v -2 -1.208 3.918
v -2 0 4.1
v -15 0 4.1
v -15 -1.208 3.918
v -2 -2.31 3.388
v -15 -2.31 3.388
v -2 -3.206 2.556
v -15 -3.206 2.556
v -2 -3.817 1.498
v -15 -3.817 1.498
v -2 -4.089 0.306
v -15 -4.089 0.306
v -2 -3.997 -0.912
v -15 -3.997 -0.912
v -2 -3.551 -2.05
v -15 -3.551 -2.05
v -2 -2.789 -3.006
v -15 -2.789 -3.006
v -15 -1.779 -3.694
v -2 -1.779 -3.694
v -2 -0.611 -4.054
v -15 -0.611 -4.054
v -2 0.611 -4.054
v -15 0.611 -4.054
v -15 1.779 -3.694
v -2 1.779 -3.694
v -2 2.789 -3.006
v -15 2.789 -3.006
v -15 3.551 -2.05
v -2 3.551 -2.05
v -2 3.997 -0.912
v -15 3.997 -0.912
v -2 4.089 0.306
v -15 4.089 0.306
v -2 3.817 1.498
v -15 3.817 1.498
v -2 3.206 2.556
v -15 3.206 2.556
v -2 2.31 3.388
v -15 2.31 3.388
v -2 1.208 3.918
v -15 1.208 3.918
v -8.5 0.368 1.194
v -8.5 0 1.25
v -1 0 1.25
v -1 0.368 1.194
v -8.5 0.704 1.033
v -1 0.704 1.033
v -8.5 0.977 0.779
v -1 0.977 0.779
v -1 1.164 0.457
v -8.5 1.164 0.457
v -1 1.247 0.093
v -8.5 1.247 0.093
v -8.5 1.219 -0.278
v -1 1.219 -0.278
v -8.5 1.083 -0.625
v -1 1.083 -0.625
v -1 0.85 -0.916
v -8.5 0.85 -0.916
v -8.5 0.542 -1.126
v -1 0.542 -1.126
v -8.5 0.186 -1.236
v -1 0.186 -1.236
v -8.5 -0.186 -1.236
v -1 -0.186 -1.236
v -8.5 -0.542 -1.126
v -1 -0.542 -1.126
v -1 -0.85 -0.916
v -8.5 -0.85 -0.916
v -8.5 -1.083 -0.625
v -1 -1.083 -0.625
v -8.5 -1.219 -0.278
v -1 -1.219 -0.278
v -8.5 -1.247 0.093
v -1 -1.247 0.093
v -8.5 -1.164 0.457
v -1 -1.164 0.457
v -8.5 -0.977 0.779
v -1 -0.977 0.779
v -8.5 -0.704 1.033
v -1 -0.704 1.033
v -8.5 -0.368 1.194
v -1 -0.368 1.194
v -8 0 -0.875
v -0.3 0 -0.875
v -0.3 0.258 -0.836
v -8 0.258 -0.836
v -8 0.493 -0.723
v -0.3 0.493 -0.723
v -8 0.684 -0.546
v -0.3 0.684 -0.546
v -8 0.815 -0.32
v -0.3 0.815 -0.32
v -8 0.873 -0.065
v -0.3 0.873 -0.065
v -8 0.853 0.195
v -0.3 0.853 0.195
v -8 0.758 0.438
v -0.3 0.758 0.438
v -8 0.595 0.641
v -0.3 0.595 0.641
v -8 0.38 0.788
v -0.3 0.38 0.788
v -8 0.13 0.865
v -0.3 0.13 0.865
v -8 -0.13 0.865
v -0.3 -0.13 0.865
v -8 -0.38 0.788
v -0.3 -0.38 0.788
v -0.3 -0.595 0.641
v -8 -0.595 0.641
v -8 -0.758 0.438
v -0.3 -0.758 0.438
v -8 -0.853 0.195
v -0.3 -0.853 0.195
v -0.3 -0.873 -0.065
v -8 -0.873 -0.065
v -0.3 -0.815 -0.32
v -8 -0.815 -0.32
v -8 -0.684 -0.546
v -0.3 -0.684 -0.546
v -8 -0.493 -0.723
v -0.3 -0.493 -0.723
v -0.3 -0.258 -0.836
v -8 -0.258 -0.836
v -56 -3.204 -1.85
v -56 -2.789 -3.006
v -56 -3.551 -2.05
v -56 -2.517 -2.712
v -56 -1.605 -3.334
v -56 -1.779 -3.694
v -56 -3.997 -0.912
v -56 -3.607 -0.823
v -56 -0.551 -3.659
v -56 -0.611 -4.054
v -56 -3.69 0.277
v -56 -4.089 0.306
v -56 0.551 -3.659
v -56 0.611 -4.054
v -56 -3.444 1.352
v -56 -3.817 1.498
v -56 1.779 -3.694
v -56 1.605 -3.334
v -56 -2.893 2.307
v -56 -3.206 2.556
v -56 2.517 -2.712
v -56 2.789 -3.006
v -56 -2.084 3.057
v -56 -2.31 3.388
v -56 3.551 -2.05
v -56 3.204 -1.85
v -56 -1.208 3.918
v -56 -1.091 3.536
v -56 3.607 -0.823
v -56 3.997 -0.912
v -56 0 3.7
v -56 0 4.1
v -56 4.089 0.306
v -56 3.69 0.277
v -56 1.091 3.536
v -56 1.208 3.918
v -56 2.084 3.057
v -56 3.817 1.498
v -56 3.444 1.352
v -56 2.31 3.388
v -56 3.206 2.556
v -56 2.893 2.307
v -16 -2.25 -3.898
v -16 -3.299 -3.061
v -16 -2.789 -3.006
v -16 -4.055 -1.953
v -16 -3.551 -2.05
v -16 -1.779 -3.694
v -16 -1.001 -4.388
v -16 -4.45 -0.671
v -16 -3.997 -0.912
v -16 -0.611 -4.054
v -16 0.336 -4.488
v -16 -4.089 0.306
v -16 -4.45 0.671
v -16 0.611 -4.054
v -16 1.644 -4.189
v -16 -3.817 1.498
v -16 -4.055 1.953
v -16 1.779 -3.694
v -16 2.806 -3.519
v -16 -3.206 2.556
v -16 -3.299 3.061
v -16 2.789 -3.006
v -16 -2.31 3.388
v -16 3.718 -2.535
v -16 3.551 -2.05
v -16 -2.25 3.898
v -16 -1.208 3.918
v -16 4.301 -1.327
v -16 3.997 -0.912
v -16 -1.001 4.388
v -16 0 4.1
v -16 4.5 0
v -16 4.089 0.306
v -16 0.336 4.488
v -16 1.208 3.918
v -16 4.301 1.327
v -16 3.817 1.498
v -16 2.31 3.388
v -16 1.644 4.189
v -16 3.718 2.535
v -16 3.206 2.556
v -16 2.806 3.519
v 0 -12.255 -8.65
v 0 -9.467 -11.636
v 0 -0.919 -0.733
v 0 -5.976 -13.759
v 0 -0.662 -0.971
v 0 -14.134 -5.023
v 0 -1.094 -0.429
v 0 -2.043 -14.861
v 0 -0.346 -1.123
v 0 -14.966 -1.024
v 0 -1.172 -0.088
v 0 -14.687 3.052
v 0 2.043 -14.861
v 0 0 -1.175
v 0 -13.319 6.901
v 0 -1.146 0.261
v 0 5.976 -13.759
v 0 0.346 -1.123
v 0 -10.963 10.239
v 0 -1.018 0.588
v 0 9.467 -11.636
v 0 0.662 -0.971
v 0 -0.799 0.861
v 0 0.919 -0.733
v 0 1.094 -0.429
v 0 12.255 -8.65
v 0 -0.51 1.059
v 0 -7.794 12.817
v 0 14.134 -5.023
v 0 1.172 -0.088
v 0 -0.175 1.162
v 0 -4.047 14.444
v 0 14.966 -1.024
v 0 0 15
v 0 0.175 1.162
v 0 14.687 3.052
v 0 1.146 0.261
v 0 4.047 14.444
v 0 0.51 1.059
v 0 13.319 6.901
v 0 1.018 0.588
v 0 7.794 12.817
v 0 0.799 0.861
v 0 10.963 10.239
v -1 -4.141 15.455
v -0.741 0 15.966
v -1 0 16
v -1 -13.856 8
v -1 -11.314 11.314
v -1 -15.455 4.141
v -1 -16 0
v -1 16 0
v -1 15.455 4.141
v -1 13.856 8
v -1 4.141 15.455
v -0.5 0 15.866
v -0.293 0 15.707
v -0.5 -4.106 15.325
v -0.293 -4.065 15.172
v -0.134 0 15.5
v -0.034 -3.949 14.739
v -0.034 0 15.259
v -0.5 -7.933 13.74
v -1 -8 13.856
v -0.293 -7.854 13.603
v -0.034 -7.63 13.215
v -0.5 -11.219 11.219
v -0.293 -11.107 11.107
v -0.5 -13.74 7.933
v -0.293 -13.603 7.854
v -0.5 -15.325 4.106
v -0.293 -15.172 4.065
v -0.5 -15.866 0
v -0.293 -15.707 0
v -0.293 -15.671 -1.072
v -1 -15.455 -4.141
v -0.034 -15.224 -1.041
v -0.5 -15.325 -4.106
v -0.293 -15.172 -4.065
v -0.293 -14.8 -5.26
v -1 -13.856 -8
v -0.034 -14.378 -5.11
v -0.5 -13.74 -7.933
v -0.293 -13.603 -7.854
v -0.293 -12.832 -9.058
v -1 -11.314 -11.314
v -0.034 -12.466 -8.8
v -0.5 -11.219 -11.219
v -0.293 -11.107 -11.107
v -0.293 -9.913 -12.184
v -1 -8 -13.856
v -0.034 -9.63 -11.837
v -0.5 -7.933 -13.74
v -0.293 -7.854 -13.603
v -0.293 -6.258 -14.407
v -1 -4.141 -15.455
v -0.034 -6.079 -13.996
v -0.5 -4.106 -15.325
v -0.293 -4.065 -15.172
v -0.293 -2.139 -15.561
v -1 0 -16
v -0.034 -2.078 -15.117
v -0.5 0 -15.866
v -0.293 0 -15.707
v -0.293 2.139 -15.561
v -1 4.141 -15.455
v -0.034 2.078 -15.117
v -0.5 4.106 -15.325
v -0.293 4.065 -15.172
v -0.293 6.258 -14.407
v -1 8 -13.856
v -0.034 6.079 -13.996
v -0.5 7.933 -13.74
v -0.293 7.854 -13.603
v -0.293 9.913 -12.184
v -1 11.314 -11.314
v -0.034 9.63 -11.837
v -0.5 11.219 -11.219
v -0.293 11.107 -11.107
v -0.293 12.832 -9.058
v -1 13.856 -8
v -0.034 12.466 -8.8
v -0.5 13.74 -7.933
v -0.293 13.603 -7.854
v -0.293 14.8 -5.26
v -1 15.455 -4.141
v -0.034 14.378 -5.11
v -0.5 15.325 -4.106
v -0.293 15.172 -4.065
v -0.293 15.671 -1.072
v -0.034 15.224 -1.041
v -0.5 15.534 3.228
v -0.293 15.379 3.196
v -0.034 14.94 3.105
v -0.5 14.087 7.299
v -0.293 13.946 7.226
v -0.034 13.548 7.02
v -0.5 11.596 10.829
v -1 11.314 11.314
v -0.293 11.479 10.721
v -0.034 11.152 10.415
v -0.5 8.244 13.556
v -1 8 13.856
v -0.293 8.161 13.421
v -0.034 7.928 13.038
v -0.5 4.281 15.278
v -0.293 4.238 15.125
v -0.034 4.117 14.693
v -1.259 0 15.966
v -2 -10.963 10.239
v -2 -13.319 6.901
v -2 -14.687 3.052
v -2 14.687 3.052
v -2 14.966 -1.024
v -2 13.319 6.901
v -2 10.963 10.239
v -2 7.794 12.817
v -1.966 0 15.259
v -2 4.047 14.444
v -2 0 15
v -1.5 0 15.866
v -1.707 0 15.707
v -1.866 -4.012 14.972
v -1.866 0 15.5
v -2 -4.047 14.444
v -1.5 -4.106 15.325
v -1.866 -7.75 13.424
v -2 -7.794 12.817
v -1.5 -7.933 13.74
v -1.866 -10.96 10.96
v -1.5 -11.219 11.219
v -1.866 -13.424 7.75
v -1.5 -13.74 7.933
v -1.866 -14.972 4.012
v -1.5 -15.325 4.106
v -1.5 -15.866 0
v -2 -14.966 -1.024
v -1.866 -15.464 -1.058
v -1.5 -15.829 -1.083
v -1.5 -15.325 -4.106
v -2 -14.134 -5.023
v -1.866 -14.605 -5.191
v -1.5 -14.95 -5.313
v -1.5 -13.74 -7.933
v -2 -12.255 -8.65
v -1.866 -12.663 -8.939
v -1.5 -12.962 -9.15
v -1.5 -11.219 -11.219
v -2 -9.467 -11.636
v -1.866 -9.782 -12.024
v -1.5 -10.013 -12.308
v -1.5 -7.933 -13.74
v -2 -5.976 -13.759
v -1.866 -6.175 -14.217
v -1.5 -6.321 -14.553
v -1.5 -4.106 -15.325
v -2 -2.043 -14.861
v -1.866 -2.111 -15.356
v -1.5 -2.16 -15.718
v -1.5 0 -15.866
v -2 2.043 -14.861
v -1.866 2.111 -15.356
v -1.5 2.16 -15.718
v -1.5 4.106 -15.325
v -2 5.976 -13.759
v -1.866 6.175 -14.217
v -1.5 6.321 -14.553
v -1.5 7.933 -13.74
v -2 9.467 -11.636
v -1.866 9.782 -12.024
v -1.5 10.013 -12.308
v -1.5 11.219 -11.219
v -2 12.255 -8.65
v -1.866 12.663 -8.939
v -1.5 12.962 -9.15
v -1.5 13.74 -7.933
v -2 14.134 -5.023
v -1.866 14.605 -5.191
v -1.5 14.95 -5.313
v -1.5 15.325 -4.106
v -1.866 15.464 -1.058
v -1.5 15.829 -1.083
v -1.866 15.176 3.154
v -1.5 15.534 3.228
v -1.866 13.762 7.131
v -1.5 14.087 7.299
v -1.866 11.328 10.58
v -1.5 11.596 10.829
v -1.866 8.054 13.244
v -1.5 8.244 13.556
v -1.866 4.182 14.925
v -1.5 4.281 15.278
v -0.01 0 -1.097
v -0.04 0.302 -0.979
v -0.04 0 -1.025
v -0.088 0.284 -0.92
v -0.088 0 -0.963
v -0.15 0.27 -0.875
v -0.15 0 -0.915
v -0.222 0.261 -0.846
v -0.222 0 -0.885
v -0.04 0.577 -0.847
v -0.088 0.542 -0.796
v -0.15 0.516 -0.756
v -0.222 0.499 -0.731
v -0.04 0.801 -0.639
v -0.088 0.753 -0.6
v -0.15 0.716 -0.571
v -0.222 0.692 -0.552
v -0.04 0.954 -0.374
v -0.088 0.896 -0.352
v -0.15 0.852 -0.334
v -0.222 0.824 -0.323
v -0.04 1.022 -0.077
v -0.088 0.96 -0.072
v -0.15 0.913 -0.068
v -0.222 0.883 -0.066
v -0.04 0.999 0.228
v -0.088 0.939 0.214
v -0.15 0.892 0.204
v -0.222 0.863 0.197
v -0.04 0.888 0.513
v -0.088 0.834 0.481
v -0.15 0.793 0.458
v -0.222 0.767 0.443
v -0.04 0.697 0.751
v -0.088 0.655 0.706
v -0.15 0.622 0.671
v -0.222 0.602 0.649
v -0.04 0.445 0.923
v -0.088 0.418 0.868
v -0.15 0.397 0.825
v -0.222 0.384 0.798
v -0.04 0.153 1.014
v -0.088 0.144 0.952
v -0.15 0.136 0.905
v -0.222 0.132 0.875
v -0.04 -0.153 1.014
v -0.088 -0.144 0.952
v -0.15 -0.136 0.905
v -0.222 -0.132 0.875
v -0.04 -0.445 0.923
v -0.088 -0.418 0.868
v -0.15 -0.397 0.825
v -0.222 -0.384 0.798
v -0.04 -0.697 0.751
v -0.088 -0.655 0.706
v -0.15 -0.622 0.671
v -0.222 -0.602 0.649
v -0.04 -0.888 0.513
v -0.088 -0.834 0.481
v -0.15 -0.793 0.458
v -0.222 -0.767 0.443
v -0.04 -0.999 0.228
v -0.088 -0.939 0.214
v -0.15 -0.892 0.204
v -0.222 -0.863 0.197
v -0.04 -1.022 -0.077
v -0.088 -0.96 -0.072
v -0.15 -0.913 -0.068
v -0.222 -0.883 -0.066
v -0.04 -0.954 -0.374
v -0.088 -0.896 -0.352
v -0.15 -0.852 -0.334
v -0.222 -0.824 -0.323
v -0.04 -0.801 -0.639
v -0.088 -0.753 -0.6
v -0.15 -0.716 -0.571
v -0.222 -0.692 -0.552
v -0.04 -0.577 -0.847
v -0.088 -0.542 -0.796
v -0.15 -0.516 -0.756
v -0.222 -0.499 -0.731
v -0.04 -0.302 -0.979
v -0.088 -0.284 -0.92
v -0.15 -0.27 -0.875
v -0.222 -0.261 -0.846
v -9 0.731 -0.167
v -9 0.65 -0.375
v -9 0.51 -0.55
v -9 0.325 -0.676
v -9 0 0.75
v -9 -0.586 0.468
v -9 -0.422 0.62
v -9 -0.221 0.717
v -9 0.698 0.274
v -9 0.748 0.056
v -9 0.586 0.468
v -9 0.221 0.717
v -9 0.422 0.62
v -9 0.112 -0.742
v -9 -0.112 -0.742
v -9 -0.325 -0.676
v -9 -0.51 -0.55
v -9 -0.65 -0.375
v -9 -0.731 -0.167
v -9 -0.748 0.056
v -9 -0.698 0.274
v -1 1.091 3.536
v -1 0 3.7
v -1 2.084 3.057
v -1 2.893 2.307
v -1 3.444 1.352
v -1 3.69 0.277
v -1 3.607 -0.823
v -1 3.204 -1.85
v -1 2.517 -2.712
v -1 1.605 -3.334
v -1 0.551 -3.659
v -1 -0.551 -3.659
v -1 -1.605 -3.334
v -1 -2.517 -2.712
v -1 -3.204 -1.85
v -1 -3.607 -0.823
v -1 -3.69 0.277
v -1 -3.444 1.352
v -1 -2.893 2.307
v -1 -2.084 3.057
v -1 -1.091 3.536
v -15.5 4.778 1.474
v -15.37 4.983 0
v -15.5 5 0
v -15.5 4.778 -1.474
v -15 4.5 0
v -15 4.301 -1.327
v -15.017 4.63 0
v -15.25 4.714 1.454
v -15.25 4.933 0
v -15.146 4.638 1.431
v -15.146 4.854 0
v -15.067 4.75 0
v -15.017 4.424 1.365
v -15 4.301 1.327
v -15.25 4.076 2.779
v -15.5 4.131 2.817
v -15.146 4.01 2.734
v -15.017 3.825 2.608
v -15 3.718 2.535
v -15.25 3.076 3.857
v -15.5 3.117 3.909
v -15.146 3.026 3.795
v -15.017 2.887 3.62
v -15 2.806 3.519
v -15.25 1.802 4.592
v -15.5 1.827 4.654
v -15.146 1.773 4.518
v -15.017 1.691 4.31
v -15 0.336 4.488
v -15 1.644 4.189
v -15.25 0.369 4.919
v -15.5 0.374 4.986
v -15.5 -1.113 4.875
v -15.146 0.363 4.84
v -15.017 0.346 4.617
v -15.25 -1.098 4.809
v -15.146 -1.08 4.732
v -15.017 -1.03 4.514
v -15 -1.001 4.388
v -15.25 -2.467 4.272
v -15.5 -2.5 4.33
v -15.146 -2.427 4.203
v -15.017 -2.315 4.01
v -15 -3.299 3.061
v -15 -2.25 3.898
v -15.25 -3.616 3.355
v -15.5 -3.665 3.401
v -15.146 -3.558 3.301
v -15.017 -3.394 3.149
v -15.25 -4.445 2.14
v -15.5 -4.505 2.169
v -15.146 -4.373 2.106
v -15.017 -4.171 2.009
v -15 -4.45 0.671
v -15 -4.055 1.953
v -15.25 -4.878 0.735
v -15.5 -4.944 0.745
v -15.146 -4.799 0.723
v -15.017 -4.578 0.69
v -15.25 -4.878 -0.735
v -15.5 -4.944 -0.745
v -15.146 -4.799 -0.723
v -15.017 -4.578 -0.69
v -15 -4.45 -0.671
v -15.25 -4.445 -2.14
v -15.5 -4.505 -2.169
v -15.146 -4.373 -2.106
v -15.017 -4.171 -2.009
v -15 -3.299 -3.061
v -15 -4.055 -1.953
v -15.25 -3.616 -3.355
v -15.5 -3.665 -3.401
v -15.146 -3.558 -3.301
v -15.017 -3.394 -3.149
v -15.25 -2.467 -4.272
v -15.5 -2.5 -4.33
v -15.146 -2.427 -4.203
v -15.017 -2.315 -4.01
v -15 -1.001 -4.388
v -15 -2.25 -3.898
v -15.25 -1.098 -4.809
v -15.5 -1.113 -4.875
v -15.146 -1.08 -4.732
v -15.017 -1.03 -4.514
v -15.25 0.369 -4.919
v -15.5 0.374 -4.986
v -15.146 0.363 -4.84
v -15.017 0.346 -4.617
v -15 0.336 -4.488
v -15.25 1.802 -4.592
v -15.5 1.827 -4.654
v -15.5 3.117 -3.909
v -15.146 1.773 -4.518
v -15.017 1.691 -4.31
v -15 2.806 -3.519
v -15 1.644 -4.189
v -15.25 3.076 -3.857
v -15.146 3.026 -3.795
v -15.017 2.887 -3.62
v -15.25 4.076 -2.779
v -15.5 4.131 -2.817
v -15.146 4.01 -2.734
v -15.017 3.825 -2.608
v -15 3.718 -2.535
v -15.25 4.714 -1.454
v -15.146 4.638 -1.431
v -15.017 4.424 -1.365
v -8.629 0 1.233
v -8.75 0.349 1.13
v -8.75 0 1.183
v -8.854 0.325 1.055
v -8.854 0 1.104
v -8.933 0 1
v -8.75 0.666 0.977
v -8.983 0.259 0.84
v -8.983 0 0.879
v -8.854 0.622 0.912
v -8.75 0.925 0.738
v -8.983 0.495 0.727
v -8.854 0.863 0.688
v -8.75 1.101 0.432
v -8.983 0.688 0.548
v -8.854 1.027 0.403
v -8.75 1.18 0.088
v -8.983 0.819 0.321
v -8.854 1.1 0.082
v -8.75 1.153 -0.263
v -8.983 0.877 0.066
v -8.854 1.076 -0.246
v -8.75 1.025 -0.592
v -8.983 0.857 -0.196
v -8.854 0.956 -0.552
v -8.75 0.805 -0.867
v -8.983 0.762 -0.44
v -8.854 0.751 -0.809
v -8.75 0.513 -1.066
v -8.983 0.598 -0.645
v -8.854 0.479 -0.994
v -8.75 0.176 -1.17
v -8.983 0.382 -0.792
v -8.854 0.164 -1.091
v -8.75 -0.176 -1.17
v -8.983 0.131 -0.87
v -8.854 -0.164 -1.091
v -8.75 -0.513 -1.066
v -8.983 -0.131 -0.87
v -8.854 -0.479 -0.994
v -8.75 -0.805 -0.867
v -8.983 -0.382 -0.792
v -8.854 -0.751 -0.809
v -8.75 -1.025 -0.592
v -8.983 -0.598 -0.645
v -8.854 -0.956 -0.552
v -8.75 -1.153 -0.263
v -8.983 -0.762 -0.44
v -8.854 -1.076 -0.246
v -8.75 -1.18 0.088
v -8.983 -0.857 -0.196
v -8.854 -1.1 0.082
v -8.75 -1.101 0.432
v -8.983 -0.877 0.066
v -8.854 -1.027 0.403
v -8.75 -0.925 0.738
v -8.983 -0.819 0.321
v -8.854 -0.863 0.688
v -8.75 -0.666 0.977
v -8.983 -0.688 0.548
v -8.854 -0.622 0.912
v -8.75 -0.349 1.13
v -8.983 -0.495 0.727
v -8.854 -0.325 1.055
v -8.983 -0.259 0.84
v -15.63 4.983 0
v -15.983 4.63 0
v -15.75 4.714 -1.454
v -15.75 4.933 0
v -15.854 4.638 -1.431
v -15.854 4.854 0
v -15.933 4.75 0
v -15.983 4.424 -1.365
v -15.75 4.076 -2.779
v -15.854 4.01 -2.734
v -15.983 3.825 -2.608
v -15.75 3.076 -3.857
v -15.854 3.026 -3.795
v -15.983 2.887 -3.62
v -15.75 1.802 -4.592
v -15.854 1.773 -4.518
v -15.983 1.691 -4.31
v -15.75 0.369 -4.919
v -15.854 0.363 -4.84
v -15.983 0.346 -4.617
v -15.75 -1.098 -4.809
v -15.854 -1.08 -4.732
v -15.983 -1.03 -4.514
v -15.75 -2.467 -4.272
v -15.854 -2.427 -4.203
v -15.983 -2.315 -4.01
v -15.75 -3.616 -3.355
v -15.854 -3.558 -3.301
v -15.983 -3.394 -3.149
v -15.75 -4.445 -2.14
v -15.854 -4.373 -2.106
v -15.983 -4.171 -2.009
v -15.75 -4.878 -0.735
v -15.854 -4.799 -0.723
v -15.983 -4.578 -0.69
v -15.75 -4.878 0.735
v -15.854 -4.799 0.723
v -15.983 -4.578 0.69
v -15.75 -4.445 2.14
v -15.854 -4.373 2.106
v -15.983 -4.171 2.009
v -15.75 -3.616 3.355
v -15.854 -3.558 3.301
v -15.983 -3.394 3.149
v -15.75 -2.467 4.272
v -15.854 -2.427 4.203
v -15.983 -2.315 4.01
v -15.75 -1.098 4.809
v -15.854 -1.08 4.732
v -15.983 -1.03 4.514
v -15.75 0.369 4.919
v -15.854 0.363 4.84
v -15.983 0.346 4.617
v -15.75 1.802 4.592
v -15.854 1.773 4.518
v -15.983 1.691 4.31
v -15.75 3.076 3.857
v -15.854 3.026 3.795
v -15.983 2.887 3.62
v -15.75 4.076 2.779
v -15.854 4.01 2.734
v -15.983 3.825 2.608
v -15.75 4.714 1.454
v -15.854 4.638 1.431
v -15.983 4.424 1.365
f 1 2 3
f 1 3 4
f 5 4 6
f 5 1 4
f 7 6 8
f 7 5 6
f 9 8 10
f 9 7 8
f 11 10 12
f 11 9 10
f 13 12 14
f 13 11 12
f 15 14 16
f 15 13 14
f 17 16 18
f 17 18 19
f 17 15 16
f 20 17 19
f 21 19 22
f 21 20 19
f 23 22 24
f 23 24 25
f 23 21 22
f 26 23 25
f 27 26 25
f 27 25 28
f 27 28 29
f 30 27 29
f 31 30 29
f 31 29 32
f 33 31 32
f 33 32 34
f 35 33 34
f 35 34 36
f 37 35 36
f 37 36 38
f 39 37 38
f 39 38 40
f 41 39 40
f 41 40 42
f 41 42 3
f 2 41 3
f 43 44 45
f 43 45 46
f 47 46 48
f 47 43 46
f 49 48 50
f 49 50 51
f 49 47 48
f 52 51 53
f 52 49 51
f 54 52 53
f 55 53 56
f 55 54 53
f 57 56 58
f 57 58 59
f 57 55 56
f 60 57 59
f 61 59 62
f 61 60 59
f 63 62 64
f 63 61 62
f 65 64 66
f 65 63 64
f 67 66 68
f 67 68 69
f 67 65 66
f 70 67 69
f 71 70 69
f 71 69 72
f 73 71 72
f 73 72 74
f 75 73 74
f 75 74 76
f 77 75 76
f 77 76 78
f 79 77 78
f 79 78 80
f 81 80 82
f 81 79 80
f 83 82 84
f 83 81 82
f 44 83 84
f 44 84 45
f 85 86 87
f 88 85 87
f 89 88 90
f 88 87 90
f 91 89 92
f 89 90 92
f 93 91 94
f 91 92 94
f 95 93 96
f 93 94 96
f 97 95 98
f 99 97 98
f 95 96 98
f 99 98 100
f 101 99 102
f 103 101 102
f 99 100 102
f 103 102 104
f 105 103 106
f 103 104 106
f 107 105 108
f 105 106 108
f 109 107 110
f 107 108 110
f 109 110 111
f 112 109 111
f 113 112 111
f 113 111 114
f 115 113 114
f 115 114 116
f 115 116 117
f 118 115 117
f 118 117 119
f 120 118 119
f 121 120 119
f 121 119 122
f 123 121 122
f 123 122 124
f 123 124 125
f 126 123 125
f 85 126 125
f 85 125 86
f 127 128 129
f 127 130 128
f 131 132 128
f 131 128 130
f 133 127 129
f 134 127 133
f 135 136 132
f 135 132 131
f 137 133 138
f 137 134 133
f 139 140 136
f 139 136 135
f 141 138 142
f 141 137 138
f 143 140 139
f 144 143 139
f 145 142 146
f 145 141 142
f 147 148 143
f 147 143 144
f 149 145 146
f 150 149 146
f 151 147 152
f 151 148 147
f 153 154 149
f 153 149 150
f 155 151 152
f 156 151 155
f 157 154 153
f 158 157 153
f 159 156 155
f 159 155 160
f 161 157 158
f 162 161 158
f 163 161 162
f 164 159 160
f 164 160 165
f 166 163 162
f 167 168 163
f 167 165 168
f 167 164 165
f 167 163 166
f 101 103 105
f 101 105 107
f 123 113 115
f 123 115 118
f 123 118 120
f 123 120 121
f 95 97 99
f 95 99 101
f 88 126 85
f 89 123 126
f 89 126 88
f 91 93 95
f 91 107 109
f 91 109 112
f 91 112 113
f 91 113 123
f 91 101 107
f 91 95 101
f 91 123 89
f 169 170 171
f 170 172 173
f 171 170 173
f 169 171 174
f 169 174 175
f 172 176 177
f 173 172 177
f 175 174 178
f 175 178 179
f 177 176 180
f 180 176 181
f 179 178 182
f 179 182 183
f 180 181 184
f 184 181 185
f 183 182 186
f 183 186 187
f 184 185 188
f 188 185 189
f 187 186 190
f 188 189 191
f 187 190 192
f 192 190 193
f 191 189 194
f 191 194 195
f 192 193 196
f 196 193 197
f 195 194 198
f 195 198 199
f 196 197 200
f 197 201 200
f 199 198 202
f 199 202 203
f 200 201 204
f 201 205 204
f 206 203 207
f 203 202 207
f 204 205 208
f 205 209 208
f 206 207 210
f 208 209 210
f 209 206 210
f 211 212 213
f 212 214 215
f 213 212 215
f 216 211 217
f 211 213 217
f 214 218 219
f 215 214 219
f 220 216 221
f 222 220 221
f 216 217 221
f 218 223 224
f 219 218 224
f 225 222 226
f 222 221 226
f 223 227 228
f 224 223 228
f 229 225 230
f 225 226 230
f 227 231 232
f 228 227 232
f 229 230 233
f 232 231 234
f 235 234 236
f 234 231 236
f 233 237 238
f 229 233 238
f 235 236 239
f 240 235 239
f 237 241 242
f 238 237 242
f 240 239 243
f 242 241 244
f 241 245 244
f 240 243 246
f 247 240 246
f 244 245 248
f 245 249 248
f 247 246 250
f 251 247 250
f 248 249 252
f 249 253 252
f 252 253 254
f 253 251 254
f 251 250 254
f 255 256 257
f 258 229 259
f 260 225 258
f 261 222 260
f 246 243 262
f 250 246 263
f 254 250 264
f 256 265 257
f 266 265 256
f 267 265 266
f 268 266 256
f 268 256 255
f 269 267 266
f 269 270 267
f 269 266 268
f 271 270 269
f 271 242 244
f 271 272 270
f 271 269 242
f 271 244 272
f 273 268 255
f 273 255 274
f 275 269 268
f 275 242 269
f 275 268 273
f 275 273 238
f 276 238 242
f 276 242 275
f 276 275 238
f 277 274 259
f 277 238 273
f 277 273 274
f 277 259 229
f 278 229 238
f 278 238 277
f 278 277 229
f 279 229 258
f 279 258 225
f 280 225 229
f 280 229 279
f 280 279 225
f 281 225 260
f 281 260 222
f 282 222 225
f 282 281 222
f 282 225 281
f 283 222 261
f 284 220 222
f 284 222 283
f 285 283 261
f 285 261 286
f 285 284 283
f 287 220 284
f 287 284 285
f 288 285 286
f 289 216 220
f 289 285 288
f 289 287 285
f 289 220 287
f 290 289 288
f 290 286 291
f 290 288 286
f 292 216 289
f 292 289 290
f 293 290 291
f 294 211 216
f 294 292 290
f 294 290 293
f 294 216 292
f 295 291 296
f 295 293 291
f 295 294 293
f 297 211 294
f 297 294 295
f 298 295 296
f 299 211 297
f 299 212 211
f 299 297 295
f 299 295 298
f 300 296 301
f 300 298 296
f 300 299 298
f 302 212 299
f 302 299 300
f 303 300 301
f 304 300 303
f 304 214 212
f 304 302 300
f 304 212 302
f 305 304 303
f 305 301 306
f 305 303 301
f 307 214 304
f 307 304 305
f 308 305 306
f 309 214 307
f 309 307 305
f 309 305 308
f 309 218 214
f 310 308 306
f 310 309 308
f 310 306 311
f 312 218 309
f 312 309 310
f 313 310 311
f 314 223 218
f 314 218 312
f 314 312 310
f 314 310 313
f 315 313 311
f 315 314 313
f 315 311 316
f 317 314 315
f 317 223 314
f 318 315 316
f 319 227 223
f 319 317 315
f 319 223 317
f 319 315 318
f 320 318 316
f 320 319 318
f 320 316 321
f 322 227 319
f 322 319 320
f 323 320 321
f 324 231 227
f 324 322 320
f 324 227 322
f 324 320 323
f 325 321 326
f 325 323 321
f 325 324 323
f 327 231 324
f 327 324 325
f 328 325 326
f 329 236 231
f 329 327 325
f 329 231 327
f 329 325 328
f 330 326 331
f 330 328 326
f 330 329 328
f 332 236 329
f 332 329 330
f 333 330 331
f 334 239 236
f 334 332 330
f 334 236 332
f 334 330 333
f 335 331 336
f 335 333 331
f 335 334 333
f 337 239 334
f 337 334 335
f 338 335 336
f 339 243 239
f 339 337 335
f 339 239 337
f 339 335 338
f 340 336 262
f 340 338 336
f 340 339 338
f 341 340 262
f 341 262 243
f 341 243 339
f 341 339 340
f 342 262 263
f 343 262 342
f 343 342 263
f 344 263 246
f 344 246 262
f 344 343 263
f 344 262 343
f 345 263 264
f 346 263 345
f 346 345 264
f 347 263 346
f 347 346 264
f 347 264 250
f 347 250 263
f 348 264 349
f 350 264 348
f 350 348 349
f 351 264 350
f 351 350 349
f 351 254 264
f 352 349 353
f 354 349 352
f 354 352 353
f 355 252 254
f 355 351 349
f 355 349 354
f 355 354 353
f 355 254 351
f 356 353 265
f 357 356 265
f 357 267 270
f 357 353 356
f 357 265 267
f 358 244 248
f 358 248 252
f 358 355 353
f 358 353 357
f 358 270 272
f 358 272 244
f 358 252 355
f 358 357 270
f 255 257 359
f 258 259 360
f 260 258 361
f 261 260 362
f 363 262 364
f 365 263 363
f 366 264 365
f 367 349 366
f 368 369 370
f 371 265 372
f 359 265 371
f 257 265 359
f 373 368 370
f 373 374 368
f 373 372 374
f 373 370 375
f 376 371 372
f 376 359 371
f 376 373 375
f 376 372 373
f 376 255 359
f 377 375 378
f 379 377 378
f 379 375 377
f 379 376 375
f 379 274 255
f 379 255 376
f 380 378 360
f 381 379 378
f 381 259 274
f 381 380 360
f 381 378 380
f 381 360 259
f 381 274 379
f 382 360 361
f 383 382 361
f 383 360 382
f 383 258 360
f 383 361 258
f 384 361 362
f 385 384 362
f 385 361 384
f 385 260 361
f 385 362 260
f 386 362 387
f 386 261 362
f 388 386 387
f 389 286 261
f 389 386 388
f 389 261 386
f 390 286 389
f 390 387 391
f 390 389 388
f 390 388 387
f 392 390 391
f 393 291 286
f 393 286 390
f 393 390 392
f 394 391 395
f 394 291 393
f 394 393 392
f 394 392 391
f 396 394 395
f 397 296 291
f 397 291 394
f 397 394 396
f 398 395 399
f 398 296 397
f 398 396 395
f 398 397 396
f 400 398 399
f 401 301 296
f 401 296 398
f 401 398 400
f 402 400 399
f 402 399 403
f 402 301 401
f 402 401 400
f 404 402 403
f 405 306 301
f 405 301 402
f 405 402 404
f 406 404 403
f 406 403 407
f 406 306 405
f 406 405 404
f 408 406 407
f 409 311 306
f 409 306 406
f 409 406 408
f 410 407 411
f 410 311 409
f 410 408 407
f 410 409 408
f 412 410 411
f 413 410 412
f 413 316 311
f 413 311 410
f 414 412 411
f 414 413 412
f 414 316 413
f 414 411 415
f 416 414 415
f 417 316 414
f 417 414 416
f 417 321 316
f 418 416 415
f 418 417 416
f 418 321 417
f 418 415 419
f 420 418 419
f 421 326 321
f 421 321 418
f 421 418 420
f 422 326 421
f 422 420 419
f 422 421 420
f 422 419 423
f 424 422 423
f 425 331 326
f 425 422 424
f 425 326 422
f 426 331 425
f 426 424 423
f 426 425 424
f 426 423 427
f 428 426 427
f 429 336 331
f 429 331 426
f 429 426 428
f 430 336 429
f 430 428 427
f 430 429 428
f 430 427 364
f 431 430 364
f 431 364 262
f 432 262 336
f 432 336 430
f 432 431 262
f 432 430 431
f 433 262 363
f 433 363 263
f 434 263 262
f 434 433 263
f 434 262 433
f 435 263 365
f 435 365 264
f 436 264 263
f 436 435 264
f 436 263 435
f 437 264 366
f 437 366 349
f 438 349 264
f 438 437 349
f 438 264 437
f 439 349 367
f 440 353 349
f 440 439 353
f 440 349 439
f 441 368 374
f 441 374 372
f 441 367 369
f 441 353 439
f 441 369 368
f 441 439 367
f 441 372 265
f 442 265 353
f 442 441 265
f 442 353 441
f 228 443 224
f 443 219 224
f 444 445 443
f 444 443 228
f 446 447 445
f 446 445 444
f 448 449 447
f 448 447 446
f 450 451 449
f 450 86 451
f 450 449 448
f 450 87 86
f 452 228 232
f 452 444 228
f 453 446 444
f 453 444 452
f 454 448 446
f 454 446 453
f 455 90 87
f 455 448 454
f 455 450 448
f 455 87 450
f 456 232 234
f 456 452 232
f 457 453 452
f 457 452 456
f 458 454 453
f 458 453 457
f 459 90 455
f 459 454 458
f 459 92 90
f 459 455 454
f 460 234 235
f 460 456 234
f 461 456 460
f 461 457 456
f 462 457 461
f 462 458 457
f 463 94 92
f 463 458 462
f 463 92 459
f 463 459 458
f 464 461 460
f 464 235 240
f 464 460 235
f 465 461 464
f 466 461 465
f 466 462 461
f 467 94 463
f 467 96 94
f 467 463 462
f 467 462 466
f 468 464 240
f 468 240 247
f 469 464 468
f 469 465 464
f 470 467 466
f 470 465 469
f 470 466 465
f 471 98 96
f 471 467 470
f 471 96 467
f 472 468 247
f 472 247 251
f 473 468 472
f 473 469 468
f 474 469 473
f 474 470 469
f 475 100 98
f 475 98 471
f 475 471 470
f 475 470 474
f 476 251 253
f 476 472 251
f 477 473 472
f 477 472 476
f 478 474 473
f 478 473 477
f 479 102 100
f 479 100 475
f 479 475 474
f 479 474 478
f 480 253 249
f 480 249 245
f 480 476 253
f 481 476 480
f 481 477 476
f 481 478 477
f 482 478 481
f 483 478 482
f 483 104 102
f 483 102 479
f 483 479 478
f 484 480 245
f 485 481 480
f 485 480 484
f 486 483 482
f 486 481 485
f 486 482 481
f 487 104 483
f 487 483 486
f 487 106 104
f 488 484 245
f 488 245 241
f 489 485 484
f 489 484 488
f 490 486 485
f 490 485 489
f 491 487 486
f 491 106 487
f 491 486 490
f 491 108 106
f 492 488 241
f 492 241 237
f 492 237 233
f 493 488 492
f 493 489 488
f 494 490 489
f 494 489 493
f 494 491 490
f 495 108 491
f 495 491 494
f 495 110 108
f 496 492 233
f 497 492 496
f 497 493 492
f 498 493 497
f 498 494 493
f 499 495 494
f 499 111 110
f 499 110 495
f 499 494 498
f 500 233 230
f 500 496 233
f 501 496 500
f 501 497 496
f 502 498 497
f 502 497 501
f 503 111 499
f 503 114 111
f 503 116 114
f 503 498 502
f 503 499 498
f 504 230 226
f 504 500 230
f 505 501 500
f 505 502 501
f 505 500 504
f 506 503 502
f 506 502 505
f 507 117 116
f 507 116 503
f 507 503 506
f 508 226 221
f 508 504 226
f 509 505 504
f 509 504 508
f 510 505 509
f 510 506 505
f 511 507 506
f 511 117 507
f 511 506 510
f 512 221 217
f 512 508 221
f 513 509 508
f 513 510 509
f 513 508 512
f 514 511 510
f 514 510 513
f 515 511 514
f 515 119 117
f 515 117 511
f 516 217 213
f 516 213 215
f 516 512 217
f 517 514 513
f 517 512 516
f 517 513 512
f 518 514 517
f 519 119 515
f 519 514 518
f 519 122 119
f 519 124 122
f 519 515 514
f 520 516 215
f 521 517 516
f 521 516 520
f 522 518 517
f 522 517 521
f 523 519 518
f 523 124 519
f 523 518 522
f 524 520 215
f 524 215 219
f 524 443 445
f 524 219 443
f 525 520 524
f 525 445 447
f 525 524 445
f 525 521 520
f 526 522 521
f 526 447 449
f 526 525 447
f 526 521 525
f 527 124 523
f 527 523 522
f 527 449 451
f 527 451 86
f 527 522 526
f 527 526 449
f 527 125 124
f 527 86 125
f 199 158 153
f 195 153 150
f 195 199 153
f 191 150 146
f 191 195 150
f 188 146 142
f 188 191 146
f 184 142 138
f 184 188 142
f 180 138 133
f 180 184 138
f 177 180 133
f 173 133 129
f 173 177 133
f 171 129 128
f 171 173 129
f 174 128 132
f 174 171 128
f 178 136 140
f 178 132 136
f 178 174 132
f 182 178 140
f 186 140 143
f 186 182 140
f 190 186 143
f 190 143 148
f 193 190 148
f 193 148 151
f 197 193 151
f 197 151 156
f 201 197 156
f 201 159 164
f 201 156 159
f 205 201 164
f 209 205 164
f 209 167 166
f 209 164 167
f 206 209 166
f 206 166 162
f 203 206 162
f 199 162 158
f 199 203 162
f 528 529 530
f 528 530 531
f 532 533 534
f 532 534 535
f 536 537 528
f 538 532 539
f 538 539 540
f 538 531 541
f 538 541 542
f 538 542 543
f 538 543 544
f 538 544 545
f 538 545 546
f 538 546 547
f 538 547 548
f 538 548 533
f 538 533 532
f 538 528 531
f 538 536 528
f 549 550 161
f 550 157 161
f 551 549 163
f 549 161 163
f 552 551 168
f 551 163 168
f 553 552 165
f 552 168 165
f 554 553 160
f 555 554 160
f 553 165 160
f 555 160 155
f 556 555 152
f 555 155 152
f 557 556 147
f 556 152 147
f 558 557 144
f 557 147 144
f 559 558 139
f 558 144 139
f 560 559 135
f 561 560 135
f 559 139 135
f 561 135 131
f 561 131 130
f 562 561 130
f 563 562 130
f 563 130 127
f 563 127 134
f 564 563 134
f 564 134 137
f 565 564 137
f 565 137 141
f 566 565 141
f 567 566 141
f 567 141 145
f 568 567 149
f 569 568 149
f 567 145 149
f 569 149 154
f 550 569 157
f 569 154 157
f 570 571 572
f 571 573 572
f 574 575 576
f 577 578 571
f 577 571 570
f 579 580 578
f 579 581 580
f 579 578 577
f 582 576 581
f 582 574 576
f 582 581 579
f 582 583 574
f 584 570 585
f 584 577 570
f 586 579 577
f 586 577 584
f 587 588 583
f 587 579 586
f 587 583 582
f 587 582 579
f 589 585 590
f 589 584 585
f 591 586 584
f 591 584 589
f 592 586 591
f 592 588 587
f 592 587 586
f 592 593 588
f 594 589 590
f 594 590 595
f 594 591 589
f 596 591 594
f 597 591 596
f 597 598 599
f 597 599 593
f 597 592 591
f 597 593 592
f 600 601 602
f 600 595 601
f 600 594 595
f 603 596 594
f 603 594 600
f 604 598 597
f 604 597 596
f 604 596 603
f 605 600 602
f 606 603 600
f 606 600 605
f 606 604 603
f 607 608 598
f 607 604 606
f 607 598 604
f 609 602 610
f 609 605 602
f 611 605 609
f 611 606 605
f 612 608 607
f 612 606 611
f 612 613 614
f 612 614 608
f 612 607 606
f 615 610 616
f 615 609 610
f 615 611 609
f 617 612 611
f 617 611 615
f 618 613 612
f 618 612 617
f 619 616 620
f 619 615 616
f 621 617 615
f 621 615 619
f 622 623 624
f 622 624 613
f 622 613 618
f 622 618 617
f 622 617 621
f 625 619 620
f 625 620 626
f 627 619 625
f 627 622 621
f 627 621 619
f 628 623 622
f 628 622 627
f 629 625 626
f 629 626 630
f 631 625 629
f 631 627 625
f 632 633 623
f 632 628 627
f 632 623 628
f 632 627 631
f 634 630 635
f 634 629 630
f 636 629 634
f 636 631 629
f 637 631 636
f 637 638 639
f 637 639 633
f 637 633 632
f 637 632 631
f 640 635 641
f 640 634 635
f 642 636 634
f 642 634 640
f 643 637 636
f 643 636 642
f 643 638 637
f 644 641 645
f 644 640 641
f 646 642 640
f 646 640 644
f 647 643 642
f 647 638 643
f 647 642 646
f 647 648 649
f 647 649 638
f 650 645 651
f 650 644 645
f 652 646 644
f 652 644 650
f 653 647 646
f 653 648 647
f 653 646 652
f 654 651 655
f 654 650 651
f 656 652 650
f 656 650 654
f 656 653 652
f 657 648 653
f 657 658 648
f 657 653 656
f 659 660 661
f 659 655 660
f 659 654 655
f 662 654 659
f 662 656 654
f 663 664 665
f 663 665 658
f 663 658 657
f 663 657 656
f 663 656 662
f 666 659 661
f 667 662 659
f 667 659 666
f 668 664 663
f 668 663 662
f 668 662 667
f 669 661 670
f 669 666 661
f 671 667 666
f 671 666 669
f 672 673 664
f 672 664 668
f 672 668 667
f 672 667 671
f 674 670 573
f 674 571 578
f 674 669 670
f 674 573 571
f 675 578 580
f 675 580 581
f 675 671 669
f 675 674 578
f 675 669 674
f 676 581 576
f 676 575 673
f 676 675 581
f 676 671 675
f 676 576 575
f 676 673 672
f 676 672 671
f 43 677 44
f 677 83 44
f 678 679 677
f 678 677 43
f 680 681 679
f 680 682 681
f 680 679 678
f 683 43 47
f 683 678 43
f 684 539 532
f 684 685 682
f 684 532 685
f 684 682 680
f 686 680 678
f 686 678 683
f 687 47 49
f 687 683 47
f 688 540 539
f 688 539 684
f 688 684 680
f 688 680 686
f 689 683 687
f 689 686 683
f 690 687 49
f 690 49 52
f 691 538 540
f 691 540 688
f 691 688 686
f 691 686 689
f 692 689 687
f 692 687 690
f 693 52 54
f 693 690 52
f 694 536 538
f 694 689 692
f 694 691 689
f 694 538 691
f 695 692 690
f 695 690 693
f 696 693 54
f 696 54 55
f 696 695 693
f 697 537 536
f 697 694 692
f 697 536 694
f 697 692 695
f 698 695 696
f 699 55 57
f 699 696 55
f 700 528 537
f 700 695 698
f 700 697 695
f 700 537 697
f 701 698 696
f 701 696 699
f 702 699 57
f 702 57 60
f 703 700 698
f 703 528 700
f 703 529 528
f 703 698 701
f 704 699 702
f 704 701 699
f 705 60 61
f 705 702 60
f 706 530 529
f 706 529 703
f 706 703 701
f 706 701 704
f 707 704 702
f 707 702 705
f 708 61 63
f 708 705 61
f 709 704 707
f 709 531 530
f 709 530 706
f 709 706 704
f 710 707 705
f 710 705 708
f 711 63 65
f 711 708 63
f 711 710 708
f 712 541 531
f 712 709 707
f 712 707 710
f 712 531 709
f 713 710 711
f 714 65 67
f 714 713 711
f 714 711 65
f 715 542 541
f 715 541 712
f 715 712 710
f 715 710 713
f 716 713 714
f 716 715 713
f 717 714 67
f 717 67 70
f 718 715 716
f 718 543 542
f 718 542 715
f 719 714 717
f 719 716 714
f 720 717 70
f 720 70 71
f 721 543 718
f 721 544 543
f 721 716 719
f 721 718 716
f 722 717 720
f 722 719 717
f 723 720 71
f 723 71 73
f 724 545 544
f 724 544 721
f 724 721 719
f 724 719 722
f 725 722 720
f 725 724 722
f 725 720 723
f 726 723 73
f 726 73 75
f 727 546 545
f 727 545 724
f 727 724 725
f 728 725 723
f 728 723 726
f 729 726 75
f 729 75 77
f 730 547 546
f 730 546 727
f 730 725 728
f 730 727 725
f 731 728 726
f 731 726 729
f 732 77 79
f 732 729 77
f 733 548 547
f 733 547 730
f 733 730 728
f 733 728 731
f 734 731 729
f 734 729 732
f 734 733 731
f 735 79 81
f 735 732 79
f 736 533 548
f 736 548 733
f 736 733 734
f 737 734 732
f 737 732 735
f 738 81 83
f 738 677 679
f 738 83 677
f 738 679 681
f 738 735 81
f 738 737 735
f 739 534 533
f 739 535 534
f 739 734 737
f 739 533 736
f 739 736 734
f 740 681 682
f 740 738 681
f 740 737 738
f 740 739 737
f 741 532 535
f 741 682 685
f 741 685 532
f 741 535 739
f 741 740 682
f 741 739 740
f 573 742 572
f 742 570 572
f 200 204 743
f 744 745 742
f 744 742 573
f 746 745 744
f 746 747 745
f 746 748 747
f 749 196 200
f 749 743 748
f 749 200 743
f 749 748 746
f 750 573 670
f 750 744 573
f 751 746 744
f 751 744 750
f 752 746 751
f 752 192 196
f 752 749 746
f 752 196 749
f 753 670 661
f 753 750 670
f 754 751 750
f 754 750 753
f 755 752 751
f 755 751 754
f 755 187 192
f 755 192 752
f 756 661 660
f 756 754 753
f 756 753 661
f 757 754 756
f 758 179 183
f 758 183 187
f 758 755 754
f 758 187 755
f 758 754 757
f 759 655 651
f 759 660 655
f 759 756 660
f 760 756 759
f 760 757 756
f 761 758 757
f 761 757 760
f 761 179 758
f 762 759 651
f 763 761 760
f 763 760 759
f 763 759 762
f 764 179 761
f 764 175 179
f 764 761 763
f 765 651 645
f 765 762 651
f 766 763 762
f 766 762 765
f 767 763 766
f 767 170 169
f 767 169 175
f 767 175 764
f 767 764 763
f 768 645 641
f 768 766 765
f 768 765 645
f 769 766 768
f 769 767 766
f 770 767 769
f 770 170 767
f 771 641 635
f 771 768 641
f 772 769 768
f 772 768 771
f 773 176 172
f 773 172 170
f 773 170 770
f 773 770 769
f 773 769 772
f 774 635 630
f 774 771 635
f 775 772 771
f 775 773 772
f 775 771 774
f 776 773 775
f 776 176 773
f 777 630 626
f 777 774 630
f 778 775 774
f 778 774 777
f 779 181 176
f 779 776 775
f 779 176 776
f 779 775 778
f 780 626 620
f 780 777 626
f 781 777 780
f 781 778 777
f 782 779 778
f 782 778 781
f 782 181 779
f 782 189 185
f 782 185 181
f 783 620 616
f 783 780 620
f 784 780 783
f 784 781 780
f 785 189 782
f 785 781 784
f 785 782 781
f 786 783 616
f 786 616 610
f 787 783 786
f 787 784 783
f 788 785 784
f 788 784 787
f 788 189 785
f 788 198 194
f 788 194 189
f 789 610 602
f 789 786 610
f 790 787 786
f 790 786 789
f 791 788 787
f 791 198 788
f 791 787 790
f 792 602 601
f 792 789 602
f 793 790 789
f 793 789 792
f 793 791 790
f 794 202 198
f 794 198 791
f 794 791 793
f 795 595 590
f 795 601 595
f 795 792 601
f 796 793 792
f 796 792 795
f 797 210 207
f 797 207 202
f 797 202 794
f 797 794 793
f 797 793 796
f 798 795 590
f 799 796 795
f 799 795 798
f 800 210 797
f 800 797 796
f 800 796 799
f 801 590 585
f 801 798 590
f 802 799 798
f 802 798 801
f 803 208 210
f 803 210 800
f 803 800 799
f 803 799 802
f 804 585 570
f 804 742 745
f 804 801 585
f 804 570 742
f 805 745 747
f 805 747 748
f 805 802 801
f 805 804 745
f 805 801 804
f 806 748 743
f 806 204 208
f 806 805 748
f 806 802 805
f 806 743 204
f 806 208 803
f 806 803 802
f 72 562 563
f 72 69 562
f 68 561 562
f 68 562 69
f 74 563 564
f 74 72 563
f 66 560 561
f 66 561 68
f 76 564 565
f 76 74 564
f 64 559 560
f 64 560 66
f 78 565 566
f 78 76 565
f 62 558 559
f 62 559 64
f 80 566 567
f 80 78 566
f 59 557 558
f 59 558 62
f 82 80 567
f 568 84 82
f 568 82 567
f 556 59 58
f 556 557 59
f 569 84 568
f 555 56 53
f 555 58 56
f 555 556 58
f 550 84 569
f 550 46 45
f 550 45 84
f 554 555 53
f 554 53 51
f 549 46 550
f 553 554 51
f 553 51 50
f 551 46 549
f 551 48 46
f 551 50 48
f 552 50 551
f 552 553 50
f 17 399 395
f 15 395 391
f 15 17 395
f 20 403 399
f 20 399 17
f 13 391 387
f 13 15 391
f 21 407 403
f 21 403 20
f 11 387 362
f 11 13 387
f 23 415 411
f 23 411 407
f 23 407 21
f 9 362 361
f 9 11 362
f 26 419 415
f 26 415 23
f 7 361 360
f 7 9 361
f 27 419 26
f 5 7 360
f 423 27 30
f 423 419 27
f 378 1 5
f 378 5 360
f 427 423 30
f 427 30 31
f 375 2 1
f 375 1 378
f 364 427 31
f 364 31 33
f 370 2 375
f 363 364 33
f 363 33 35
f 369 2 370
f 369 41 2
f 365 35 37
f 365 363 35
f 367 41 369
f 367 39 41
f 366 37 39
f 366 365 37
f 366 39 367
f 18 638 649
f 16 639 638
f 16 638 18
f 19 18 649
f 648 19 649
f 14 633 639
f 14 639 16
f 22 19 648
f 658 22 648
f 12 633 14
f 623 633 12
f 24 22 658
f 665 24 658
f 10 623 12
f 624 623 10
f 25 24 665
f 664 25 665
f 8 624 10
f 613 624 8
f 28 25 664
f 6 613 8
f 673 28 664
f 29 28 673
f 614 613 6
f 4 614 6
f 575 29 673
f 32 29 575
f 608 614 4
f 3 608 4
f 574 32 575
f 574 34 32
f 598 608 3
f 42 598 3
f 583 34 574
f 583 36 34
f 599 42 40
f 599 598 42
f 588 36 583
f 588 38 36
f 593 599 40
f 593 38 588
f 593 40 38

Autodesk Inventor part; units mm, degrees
ref_plane "XY Plane" through (0, 0, 0) normal (0, 0, 1) x (1, 0, 0)
sketch "Sketch1" plane through (0, 0, 0) normal (0, 1, 0) x (-1, 0, 0)
  line L0 (0, 0) -> (50, 0)
  line L1 (0, 0) -> (0, 16)
  line L2 (0, 16) -> (2, 16)
  line L3 (2, 16) -> (2, 0)
  line L4 (2, 0) -> (2, 4.1)
  line L5 (50, 0) -> (50, 4.1)
  line L6 (50, 4.1) -> (2, 4.1)
  dimension "d0" = 50
  dimension "d1" = 16
  dimension "d2" = 2
  dimension "d3" = 4.1
  dimension "d4" = 4.1
revolve "Revolution1" add sketch "Sketch1" angle 360 about axis through (0, 0, 0) along (-1, 0, 0)
sketch "Sketch2" plane through (0, 0, 0) normal (1, 0, 0) x (0, 0, -1)
  circle A0 centre (0, 0) radius 0.875
  dimension "d6" = 1.75
extrude "Extrusion1" cut sketch "Sketch2" against normal blind 8
fillet "Fillet1" radius 0.3 1 edges at (0, 0, 0.875)
ref_plane "Work Plane1" through (-15, 0, 0) normal (1, 0, 0) x (0, 1, 0)
sketch "Sketch3" plane through (-15, 0, 0) normal (1, 0, 0) x (0, 1, 0)
  line L0 (0, 0) -> (-5.6972, 0)
  circle A0 centre (0, 0) radius 5
  dimension "d11" = 10
extrude "Extrusion2" add sketch "Sketch3" against normal blind 1
fillet "Fillet2" radius 0.5 2 edges at (-16, -5, 0) (-15, -5, 0)
ref_plane "Work Plane2" through (-16, 0, 0) normal (1, 0, 0) x (0, 1, 0)
sketch "Sketch4" plane through (-50, 0, 0) normal (-1, 0, 0) x (0, 0, 1)
  circle A0 centre (0, 0) radius 4.1
extrude "Extrusion3" add sketch "Sketch4" along normal blind 10
ref_plane "Work Plane3" through (0, 0, 0) normal (0, 1, 0) x (-1, 0, 0)
sketch "Sketch5" plane through (0, 0, 0) normal (0, 1, 0) x (-1, 0, 0)
  point P0 (0, 0)
sketch "Sketch6" plane through (-60, 0, 0) normal (-1, 0, 0) x (0, 0, 1)
  circle A0 centre (0, 0) radius 4.1
extrude "Extrusion4" cut sketch "Sketch6" against normal blind 8
sketch "Sketch7" plane through (-52, 0, 0) normal (-1, 0, 0) x (0, 0, 1)
  circle A0 centre (0, 0) radius 4.1
extrude "Extrusion5" add sketch "Sketch7" along normal blind 4
sketch "Sketch8" plane through (0, 0, 0) normal (0, 1, 0) x (-1, 0, 0)
  point P0 (0, 0)
sketch "Sketch9" plane through (-56, 0, 0) normal (-1, 0, 0) x (0, 0, 1)
  circle A0 centre (0, 0) radius 0.875 projected
  circle A1 centre (0, 0) radius 3.7
  dimension "d28" = 7.4
extrude "Extrusion7" cut sketch "Sketch9" against normal blind 47 contours A0 | A1
sketch "Sketch10" plane through (-9, 0, 0) normal (-1, 0, 0) x (0, 0, 1)
  circle A0 centre (0, 0) radius 3.7
  circle A1 centre (0, 0) radius 1.25
  dimension "d31" = 2.5
extrude "Extrusion8" cut sketch "Sketch10" against normal blind 8
fillet "Fillet3" radius 0.5 1 edges at (-9, 0, -1.25)
fillet "Fillet4" radius 1 2 edges at (-2, 0, -16) (0, 0, -16)
properties part number "axilhollow"
